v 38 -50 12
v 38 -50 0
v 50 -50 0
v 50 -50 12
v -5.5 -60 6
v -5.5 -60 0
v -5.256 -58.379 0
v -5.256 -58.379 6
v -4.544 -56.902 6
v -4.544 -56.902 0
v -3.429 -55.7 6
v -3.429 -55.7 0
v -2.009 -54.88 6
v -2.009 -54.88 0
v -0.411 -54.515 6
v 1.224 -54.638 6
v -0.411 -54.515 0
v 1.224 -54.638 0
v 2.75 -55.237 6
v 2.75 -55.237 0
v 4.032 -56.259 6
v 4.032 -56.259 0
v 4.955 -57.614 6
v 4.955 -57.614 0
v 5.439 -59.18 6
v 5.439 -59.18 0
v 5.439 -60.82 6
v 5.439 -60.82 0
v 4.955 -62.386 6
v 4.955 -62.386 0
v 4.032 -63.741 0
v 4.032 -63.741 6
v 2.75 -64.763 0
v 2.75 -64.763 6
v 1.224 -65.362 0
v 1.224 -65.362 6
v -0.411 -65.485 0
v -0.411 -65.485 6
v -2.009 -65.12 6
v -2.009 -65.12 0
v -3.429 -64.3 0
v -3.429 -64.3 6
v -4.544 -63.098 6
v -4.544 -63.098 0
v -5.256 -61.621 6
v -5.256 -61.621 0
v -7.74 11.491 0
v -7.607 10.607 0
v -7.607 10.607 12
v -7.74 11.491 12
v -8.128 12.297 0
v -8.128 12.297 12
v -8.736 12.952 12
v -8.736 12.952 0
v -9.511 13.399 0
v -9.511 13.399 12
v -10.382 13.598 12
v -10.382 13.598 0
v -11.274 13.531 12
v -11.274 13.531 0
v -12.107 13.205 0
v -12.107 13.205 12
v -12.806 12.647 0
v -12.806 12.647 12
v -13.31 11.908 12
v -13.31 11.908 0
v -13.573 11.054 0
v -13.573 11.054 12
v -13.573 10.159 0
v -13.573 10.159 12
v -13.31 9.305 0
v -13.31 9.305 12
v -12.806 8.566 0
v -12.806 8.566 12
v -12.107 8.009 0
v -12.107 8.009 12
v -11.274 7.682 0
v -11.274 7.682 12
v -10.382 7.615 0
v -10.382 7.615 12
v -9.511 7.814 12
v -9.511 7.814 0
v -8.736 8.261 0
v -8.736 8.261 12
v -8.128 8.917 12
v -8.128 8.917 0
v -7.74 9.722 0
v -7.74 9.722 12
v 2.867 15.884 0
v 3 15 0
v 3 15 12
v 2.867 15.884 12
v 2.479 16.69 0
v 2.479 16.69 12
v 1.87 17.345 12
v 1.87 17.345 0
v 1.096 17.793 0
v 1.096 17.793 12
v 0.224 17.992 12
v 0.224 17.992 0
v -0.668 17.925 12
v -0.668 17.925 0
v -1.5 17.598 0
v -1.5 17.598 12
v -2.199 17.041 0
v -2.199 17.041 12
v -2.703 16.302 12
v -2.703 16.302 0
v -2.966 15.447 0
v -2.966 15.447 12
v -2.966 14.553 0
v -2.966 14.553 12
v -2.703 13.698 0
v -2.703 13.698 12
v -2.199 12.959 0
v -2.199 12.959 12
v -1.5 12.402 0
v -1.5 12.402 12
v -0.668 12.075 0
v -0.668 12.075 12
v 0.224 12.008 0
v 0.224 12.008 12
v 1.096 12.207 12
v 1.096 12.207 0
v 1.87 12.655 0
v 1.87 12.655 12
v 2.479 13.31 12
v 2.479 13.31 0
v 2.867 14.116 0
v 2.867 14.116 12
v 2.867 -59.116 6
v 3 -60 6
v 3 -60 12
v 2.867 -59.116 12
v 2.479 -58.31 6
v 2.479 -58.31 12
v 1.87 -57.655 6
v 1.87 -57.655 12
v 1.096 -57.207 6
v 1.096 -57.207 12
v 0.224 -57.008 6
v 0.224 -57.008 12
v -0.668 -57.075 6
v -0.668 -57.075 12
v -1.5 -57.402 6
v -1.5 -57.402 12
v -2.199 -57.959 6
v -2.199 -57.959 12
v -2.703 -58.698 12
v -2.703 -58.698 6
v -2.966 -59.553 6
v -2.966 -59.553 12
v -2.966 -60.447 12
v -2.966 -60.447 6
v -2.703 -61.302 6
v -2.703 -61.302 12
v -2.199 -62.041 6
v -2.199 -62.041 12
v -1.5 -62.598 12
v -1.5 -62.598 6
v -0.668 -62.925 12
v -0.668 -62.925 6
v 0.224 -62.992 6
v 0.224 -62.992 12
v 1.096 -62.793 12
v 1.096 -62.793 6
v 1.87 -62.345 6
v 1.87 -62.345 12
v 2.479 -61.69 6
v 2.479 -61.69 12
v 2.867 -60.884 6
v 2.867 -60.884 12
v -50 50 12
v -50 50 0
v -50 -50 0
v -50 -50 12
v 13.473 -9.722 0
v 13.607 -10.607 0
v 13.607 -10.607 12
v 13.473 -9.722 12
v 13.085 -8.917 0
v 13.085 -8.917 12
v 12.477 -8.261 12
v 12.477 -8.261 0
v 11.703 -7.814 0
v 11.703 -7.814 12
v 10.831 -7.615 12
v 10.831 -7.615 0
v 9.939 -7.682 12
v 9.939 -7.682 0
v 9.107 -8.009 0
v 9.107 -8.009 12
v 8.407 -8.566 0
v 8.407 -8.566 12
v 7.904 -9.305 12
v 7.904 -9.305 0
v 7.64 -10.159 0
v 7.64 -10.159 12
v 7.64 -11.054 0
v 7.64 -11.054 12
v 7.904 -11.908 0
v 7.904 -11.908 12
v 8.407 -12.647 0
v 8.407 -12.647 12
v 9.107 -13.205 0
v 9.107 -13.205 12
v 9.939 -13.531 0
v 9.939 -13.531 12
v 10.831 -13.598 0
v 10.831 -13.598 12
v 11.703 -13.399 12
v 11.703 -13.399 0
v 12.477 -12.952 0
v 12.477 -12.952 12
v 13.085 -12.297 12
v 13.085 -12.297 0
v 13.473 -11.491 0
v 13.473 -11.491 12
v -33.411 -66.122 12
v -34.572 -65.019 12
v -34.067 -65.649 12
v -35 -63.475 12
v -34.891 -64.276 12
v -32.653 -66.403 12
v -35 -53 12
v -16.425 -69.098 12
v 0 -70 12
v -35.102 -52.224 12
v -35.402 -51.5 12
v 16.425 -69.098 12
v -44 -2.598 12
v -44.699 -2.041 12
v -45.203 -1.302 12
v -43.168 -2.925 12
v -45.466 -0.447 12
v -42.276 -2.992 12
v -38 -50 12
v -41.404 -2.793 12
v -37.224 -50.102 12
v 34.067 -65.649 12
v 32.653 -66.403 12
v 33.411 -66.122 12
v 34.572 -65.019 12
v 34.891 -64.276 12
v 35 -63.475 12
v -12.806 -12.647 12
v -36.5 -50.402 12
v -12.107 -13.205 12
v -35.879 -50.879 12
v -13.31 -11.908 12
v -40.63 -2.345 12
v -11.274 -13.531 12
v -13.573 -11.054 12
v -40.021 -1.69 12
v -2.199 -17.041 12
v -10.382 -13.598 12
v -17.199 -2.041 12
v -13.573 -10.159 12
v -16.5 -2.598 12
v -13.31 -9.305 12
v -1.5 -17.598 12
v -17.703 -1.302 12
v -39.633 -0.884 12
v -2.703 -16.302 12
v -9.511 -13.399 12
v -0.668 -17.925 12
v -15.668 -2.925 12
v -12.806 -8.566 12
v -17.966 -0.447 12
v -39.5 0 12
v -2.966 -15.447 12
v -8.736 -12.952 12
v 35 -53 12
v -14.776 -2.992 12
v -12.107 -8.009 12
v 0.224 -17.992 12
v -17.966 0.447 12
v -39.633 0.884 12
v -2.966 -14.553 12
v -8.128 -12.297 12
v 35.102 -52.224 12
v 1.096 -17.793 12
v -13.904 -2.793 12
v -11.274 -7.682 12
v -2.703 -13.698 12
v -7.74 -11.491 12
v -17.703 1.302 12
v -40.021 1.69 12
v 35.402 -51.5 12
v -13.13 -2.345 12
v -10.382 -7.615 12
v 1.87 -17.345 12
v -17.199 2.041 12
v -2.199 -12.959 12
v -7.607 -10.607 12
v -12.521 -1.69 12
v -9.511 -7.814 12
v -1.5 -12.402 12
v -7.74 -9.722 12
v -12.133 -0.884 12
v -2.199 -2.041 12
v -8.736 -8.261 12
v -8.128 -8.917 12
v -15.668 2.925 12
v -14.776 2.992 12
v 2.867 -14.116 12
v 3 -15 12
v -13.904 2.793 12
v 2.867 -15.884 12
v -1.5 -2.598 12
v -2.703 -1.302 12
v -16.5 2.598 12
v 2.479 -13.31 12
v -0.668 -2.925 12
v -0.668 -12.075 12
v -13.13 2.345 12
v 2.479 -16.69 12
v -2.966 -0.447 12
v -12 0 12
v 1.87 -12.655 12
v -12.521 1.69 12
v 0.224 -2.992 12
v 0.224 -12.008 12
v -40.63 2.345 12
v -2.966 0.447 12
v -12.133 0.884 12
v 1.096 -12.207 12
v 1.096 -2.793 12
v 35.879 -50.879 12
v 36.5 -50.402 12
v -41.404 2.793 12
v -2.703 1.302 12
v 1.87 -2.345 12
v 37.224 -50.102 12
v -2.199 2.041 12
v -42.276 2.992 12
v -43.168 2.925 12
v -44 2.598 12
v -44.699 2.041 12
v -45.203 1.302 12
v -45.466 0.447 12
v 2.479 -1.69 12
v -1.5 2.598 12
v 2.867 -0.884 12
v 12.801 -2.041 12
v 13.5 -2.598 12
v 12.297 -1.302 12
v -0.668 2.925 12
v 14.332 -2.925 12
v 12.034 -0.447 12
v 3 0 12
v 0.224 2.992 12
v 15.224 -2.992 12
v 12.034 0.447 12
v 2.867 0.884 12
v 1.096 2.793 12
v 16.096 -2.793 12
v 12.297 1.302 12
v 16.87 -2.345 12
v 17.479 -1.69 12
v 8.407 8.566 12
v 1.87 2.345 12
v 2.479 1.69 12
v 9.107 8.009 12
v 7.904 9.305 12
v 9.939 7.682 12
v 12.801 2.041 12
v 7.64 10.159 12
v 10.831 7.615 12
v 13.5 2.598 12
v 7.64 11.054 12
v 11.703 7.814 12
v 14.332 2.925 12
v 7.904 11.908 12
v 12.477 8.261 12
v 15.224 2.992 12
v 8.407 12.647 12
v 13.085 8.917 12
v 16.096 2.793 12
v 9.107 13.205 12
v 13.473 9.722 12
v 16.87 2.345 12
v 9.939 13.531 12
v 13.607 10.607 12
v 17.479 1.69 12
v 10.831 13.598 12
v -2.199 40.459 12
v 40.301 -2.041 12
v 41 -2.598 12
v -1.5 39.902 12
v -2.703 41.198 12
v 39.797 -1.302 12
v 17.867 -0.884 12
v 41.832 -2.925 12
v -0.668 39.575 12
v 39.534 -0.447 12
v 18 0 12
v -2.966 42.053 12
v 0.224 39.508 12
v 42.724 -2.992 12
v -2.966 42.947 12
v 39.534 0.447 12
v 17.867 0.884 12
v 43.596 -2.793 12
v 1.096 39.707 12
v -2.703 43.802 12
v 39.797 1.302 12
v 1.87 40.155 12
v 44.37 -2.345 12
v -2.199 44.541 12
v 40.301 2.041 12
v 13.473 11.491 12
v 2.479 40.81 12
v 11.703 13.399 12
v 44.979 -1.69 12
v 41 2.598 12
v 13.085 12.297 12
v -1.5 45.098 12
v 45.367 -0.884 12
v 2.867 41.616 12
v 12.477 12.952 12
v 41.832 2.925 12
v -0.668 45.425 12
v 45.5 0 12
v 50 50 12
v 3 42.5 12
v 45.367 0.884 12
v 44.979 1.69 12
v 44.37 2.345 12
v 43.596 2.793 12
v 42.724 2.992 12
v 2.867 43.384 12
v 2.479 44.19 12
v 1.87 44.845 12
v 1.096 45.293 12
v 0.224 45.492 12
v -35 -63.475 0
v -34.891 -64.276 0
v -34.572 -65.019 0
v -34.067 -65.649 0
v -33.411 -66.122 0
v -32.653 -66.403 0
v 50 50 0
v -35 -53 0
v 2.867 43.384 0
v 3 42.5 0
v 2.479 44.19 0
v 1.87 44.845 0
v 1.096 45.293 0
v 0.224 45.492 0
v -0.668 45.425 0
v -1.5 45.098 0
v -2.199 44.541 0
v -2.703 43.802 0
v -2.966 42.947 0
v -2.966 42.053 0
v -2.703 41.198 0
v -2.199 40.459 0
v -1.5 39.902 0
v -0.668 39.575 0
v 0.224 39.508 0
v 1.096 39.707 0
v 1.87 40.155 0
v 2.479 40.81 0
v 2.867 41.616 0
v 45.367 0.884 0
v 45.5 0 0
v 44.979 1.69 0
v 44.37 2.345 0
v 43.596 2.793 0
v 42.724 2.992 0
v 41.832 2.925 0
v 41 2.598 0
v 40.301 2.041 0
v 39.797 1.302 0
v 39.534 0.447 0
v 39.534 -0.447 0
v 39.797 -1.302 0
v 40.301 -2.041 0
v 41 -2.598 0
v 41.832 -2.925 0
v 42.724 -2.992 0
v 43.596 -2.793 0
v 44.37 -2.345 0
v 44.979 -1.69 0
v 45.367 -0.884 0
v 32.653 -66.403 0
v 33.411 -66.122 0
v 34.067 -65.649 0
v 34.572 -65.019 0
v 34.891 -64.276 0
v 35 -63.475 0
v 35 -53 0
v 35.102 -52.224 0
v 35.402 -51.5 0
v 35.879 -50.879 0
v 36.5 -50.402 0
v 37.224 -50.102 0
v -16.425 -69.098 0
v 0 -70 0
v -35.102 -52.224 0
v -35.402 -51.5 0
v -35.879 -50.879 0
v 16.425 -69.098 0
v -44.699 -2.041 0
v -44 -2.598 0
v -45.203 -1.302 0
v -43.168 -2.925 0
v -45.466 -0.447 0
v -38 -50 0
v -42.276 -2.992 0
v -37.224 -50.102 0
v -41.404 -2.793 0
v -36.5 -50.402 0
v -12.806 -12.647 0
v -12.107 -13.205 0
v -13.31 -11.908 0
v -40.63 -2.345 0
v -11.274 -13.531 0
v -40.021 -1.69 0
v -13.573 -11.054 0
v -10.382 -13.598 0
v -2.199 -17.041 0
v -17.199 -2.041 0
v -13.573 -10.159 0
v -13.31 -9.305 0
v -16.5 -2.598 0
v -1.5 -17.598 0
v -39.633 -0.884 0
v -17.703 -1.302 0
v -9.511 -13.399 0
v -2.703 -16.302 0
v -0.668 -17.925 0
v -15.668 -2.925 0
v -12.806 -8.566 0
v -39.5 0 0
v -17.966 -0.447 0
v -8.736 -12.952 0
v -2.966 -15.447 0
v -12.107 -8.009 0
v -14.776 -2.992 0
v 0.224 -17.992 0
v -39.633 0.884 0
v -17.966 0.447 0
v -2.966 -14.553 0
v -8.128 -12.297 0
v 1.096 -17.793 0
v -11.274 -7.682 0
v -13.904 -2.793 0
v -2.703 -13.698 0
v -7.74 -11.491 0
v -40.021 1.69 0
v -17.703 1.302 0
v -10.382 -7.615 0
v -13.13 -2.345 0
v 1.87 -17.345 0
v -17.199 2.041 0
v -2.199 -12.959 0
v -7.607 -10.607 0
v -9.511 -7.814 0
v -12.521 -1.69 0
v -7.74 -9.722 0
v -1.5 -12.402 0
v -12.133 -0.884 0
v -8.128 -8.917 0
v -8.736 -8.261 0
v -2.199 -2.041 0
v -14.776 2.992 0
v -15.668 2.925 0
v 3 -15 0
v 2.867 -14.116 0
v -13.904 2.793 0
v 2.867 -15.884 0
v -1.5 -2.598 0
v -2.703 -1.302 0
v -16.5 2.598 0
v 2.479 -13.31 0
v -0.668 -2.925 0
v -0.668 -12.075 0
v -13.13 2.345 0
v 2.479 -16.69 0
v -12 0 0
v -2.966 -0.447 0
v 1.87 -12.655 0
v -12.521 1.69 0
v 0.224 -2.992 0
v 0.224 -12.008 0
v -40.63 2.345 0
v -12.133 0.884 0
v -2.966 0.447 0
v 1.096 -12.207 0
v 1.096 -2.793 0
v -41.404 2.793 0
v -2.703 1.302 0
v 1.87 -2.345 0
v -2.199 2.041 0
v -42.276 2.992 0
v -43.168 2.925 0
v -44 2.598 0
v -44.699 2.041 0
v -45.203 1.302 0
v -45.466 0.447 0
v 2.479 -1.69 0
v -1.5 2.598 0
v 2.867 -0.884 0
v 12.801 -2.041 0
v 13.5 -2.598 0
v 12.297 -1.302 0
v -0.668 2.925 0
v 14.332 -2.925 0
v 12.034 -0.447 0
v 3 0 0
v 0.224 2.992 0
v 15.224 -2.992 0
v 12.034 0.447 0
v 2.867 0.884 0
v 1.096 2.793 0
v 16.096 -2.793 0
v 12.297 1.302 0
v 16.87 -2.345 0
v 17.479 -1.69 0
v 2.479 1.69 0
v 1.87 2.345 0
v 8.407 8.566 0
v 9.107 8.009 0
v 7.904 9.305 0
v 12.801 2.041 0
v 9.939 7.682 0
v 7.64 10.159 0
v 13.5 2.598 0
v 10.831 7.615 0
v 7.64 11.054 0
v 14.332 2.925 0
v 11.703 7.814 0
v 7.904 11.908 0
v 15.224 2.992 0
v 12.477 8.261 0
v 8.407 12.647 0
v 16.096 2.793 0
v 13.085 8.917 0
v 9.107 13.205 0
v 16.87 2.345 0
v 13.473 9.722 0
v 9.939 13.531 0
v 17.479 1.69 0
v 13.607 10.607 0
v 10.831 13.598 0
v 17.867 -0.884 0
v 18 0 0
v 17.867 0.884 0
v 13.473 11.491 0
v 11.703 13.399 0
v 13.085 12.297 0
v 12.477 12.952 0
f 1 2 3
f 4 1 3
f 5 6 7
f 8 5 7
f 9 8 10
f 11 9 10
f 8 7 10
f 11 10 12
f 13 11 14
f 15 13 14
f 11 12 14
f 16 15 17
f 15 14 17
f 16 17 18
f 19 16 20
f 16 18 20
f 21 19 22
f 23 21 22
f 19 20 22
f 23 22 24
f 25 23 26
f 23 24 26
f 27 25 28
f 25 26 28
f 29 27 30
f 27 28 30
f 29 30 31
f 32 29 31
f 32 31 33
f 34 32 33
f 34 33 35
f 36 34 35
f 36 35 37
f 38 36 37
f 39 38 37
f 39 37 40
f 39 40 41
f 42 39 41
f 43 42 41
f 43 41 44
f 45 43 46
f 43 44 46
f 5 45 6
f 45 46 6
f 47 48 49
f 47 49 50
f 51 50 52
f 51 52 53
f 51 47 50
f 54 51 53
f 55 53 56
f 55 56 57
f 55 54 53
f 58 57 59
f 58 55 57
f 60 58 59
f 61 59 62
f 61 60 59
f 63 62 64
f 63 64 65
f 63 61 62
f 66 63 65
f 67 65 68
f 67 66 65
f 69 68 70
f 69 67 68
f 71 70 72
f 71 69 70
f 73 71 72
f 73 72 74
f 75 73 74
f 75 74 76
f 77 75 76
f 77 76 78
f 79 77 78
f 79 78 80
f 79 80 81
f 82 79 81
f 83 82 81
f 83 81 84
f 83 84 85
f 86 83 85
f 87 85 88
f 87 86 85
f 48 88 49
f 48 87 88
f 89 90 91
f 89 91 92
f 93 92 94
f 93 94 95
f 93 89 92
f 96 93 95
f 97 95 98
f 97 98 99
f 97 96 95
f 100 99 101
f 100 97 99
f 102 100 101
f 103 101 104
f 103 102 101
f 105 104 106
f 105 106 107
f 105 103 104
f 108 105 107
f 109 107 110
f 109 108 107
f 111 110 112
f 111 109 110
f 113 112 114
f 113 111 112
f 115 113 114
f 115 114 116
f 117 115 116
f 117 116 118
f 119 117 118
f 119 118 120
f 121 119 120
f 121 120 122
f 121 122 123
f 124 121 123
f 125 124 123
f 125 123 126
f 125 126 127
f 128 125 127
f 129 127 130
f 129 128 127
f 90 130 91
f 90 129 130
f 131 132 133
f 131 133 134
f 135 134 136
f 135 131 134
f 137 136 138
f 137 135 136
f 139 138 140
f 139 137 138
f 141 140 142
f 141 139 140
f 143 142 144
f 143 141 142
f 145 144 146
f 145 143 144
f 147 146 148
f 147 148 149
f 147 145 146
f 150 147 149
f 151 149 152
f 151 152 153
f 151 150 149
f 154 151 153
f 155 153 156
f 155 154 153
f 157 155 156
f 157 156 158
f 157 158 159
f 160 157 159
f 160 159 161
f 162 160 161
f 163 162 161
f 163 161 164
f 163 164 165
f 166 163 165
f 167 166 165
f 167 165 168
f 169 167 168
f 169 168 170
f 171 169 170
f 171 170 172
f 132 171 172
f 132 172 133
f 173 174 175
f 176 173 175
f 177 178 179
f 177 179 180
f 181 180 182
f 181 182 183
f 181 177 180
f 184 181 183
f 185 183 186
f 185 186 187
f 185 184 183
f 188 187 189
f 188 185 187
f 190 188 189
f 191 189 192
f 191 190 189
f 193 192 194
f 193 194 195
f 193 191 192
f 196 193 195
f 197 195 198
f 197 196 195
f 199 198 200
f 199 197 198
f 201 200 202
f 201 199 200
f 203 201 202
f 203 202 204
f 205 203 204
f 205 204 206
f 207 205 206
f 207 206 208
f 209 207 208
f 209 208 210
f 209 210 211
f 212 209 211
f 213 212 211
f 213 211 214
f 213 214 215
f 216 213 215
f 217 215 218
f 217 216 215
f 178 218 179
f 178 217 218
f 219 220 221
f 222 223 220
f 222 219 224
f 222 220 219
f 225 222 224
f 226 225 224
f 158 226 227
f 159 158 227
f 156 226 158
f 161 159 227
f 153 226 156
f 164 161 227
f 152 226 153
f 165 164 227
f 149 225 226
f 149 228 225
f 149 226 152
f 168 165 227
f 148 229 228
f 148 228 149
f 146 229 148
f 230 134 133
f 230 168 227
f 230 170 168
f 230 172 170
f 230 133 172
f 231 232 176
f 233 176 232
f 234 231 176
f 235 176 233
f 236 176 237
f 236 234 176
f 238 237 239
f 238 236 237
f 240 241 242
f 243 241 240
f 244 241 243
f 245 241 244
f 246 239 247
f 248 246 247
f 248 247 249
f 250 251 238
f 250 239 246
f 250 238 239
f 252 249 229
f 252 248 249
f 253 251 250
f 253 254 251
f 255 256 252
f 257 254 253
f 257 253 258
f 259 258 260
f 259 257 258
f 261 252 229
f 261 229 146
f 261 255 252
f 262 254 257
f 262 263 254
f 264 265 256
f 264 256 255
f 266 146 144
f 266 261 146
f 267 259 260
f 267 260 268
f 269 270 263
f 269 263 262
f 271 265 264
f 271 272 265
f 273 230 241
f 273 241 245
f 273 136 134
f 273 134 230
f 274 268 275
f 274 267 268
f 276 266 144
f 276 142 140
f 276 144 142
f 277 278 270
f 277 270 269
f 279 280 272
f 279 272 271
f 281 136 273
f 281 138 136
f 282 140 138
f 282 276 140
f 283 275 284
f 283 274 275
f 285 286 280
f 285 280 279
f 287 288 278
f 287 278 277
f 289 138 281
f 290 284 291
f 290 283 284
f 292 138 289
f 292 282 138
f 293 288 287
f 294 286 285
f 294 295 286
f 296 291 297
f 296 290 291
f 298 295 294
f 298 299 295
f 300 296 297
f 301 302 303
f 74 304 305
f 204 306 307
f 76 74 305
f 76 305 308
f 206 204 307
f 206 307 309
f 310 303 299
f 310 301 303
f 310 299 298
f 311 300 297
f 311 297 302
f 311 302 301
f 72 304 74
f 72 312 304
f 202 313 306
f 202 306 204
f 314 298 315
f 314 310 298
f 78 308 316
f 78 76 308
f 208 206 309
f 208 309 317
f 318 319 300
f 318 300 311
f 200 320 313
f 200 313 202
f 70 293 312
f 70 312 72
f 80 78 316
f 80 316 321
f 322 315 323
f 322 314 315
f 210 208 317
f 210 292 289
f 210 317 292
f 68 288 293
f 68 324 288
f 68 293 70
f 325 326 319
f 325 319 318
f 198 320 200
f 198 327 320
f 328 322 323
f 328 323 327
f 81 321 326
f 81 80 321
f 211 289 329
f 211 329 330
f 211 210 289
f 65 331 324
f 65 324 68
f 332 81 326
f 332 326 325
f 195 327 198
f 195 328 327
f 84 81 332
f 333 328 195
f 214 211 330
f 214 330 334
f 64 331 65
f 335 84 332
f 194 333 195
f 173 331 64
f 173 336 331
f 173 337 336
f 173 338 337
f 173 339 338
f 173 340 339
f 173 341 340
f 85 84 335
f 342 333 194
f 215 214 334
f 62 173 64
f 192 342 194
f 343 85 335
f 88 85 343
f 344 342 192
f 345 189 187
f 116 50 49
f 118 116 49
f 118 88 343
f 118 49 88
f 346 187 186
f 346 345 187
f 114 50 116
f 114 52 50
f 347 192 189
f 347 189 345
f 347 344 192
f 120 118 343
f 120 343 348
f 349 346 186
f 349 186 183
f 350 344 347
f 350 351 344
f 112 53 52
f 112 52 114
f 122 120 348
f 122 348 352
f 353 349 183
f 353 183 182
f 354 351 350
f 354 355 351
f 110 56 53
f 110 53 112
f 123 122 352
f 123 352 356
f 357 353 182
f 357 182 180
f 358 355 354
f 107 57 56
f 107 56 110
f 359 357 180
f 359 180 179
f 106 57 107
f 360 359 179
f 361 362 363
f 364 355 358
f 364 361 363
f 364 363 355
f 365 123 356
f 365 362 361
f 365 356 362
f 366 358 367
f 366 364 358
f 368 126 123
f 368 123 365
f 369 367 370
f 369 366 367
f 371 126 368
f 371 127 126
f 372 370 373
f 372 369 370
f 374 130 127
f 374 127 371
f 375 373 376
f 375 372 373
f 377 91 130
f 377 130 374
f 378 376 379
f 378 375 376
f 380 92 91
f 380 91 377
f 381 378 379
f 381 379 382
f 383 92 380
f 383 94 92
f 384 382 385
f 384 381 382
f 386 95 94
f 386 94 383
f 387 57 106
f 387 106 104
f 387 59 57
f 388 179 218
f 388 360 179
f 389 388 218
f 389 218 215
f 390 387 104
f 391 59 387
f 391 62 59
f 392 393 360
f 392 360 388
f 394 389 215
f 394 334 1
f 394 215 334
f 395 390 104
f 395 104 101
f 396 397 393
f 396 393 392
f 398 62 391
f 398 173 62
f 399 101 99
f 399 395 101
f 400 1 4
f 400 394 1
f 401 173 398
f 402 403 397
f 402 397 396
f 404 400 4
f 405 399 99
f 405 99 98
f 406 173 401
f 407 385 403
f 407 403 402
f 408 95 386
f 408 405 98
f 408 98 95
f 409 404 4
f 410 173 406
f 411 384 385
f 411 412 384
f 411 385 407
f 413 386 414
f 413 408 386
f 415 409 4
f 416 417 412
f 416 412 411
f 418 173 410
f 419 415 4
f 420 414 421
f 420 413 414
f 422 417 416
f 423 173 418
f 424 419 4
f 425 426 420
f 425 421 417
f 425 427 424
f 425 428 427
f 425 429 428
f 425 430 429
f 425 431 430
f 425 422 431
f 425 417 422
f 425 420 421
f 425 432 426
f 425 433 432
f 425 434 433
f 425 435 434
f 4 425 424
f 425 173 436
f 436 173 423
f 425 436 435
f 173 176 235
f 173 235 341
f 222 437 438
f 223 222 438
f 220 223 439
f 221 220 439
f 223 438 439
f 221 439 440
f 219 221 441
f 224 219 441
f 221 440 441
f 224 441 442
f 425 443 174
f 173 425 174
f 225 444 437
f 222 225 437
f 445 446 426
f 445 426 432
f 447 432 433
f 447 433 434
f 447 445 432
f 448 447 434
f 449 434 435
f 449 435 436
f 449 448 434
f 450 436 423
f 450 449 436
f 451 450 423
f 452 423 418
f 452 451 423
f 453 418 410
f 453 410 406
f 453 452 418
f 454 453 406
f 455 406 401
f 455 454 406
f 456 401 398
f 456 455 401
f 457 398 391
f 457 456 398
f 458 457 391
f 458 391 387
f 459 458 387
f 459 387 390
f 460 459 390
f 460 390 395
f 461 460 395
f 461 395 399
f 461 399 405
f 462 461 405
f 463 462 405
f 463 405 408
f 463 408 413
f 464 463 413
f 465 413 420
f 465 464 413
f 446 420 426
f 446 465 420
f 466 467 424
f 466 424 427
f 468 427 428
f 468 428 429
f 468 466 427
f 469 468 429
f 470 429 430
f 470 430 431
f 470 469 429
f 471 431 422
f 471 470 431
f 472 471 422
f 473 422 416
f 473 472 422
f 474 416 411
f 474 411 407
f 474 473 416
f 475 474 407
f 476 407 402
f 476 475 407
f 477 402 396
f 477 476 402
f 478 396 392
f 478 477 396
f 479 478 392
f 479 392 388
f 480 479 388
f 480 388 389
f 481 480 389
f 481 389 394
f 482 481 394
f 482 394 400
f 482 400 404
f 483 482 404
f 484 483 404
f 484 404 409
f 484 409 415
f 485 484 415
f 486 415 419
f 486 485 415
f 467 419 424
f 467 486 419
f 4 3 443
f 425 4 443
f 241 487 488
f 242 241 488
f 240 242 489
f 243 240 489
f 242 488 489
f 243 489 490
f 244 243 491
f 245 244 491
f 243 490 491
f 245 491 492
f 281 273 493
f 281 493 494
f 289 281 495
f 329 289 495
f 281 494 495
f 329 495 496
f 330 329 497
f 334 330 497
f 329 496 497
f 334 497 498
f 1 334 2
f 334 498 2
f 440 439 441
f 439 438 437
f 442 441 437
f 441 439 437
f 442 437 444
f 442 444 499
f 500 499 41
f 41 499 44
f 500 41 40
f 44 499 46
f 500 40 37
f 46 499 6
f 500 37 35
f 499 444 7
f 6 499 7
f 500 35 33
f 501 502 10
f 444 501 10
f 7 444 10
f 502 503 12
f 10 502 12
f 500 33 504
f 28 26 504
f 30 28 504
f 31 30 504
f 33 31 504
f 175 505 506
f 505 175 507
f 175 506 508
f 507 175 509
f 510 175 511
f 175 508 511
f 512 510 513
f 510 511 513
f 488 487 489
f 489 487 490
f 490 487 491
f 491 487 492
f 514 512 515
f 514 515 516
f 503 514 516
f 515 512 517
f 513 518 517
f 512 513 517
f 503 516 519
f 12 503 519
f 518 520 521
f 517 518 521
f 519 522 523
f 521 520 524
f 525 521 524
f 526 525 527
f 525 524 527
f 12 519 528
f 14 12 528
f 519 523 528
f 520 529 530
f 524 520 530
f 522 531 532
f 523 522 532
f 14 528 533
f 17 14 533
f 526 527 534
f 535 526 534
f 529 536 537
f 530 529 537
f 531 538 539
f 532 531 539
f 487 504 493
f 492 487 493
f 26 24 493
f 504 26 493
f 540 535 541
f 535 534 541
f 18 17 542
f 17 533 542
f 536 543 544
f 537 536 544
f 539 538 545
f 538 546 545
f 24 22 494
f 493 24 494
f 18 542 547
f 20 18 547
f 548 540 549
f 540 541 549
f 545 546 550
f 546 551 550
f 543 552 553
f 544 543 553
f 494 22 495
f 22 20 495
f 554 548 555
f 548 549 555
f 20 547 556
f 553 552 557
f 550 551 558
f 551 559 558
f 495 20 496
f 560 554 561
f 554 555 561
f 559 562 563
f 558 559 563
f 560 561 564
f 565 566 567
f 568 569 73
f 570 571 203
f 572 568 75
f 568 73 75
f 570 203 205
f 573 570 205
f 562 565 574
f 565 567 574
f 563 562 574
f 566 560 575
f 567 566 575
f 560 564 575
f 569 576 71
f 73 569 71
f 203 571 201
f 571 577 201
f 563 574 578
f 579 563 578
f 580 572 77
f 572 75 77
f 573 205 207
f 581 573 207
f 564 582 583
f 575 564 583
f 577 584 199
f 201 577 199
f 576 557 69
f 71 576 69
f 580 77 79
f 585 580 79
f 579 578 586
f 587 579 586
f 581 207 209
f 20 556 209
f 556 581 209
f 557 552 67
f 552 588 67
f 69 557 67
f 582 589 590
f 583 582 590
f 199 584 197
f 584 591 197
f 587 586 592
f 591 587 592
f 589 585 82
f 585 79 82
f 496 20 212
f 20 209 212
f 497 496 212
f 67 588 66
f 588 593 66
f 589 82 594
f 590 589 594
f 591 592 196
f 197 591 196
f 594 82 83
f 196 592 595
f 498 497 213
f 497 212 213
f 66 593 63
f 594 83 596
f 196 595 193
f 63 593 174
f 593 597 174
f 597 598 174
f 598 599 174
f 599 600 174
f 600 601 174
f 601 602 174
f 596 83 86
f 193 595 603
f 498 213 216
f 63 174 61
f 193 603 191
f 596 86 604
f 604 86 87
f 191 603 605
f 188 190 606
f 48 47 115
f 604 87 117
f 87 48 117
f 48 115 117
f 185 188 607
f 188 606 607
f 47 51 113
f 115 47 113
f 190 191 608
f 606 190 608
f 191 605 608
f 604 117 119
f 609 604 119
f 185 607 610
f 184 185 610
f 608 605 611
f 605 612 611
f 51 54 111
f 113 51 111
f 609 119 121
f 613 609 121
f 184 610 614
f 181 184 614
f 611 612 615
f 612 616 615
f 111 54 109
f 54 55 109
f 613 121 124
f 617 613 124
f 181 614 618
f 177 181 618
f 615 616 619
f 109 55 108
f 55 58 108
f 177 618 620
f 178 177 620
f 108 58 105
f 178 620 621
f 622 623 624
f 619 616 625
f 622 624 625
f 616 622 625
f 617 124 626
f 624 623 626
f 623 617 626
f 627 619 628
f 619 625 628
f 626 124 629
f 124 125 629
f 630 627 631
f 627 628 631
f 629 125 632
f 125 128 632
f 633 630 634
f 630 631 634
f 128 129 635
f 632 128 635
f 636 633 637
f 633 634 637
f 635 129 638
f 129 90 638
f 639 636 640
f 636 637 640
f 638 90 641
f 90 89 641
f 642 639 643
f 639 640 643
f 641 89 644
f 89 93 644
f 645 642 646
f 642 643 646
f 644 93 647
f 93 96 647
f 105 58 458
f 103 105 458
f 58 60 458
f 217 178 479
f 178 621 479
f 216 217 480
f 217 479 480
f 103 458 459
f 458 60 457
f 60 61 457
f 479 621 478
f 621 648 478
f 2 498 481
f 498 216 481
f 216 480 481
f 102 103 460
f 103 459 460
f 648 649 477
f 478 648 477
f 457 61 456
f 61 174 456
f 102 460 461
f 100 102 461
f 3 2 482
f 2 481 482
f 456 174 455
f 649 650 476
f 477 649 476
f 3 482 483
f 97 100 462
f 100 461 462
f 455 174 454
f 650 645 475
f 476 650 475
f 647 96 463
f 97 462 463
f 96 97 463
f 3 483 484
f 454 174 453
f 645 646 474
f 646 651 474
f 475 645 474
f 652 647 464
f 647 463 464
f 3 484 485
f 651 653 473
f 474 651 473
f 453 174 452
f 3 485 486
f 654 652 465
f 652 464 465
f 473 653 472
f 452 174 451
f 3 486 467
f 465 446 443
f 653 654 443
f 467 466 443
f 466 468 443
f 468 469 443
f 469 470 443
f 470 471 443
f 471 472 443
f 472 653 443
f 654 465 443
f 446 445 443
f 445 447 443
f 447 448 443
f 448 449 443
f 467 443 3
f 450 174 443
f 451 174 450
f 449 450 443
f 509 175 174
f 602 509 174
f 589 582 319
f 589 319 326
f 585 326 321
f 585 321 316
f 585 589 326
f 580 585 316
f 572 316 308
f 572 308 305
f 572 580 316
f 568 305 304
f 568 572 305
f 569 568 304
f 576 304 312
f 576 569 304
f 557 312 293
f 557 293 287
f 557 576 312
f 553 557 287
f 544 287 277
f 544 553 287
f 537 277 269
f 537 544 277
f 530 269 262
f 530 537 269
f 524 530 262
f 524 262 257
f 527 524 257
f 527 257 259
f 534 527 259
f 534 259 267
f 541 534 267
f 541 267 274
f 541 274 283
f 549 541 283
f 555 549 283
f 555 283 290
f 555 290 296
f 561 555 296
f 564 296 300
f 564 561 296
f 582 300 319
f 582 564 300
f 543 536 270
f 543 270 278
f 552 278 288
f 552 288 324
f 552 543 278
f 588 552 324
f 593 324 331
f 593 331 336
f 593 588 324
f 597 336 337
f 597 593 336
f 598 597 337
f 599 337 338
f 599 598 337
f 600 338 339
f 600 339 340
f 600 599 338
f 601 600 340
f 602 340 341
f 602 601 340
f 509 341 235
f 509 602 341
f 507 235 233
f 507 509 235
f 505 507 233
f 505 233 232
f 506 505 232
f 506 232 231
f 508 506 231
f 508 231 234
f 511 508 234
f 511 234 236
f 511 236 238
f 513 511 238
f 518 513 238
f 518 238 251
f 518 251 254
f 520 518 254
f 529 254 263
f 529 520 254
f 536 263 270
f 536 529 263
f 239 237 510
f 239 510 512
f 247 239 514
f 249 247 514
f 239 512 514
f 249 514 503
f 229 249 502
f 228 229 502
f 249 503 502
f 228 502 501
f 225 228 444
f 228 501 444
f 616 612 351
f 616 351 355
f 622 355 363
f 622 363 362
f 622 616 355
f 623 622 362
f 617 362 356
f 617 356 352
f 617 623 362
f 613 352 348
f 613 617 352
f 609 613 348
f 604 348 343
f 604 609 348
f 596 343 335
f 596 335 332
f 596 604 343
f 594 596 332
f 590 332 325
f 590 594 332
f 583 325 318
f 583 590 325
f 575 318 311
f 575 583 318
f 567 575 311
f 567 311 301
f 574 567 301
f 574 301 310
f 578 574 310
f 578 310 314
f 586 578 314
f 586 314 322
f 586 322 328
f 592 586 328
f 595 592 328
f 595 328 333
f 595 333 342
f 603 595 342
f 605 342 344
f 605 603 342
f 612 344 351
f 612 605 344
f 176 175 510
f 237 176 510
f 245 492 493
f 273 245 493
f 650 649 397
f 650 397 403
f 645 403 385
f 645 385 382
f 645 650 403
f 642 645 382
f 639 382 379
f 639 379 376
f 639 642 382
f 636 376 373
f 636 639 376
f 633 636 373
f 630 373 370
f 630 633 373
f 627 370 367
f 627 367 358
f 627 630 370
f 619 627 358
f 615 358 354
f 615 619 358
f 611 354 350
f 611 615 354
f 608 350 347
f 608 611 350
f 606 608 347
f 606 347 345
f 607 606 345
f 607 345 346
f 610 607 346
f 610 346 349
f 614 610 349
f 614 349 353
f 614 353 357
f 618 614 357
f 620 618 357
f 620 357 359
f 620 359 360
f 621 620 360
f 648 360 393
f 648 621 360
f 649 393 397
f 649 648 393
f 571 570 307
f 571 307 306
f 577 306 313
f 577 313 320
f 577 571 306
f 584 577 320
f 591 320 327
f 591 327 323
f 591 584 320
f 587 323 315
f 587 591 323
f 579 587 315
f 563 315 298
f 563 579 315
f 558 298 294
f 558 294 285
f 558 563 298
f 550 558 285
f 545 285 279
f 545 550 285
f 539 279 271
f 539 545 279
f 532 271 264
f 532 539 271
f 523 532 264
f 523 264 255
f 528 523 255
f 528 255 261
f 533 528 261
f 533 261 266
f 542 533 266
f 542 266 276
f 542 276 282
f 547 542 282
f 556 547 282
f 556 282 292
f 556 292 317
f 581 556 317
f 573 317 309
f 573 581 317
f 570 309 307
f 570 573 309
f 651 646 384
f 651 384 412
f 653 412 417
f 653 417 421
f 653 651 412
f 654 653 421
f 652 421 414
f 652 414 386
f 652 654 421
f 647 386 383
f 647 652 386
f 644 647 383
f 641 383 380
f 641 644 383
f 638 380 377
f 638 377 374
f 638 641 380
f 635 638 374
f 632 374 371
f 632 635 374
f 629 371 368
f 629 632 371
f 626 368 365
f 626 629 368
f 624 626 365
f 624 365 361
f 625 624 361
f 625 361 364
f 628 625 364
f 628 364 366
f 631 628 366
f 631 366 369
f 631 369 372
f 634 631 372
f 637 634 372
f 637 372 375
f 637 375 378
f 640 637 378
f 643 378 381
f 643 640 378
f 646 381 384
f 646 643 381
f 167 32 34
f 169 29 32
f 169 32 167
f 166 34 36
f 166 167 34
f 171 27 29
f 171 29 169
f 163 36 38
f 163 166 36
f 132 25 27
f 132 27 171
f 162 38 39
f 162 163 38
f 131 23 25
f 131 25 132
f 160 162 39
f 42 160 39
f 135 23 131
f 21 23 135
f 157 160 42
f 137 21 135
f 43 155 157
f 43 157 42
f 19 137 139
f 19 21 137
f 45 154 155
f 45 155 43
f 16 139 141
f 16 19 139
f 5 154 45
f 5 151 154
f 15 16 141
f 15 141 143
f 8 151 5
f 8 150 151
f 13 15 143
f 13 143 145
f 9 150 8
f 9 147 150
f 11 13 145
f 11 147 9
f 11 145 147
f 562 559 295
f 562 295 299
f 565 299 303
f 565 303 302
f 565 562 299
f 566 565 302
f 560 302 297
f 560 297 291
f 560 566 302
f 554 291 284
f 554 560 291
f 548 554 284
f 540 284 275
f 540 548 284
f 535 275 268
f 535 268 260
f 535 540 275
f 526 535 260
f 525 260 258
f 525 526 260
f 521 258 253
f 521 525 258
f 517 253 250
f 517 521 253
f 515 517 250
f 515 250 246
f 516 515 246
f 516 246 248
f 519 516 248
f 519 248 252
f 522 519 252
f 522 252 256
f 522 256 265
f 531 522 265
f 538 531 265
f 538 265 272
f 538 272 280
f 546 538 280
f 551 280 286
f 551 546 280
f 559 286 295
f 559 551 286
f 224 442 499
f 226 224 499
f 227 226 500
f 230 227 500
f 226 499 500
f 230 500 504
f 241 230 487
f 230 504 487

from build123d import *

# Parameters (mm, degrees)
SKETCH_1_R          = 3
EXTRUDE_1_DEPTH     = 12
SKETCH_3_R          = 5.5
CUT_EXTRUDE_2_DEPTH = 6


with BuildPart() as part:
    # 草图1 → 凸台-拉伸1 (new body)
    with BuildSketch(Plane.XY):
        with BuildLine():
            Line((-35, -53), (-35, -63.474736452))
            ThreePointArc((-35, -63.474736452), (-34.340852801, -65.351011529), (-32.653061224, -66.402792298))
            ThreePointArc((-32.653061224, -66.402792298), (0, -70), (32.653061224, -66.402792298))
            ThreePointArc((32.653061224, -66.402792298), (34.340852801, -65.351011529), (35, -63.474736452))
            Line((35, -63.474736452), (35, -53))
            ThreePointArc((35, -53), (35.878679656, -50.878679656), (38, -50))
            Line((38, -50), (50, -50))
            Line((50, -50), (50, 50))
            Line((50, 50), (0, 50))
            Line((0, 50), (-50, 50))
            Line((-50, 50), (-50, -50))
            Line((-50, -50), (-38, -50))
            ThreePointArc((-38, -50), (-35.878679656, -50.878679656), (-35, -53))
        make_face()
        with Locations((-42.5, 0)):
            Circle(SKETCH_1_R, mode=Mode.SUBTRACT)
        with Locations((42.5, 0)):
            Circle(SKETCH_1_R, mode=Mode.SUBTRACT)
        with Locations((0, -60)):
            Circle(SKETCH_1_R, mode=Mode.SUBTRACT)
        Circle(SKETCH_1_R, mode=Mode.SUBTRACT)
        with Locations((0, 42.5)):
            Circle(SKETCH_1_R, mode=Mode.SUBTRACT)
        with Locations((15, 0)):
            Circle(SKETCH_1_R, mode=Mode.SUBTRACT)
        with Locations((10.606601718, -10.606601718)):
            Circle(SKETCH_1_R, mode=Mode.SUBTRACT)
        with Locations((0, -15)):
            Circle(SKETCH_1_R, mode=Mode.SUBTRACT)
        with Locations((-10.606601718, -10.606601718)):
            Circle(SKETCH_1_R, mode=Mode.SUBTRACT)
        with Locations((-15, 0)):
            Circle(SKETCH_1_R, mode=Mode.SUBTRACT)
        with Locations((-10.606601718, 10.606601718)):
            Circle(SKETCH_1_R, mode=Mode.SUBTRACT)
        with Locations((0, 15)):
            Circle(SKETCH_1_R, mode=Mode.SUBTRACT)
        with Locations((10.606601718, 10.606601718)):
            Circle(SKETCH_1_R, mode=Mode.SUBTRACT)
    extrude(amount=EXTRUDE_1_DEPTH)

    # 草图3 → 切除-拉伸2 (cut)
    with BuildSketch(Plane(origin=(0, 0, 0), x_dir=(-1, 0, 0), z_dir=(0, 0, -1))):
        with Locations((0, -60)):
            Circle(SKETCH_3_R)
    extrude(amount=-CUT_EXTRUDE_2_DEPTH, mode=Mode.SUBTRACT)


solid = part.part
